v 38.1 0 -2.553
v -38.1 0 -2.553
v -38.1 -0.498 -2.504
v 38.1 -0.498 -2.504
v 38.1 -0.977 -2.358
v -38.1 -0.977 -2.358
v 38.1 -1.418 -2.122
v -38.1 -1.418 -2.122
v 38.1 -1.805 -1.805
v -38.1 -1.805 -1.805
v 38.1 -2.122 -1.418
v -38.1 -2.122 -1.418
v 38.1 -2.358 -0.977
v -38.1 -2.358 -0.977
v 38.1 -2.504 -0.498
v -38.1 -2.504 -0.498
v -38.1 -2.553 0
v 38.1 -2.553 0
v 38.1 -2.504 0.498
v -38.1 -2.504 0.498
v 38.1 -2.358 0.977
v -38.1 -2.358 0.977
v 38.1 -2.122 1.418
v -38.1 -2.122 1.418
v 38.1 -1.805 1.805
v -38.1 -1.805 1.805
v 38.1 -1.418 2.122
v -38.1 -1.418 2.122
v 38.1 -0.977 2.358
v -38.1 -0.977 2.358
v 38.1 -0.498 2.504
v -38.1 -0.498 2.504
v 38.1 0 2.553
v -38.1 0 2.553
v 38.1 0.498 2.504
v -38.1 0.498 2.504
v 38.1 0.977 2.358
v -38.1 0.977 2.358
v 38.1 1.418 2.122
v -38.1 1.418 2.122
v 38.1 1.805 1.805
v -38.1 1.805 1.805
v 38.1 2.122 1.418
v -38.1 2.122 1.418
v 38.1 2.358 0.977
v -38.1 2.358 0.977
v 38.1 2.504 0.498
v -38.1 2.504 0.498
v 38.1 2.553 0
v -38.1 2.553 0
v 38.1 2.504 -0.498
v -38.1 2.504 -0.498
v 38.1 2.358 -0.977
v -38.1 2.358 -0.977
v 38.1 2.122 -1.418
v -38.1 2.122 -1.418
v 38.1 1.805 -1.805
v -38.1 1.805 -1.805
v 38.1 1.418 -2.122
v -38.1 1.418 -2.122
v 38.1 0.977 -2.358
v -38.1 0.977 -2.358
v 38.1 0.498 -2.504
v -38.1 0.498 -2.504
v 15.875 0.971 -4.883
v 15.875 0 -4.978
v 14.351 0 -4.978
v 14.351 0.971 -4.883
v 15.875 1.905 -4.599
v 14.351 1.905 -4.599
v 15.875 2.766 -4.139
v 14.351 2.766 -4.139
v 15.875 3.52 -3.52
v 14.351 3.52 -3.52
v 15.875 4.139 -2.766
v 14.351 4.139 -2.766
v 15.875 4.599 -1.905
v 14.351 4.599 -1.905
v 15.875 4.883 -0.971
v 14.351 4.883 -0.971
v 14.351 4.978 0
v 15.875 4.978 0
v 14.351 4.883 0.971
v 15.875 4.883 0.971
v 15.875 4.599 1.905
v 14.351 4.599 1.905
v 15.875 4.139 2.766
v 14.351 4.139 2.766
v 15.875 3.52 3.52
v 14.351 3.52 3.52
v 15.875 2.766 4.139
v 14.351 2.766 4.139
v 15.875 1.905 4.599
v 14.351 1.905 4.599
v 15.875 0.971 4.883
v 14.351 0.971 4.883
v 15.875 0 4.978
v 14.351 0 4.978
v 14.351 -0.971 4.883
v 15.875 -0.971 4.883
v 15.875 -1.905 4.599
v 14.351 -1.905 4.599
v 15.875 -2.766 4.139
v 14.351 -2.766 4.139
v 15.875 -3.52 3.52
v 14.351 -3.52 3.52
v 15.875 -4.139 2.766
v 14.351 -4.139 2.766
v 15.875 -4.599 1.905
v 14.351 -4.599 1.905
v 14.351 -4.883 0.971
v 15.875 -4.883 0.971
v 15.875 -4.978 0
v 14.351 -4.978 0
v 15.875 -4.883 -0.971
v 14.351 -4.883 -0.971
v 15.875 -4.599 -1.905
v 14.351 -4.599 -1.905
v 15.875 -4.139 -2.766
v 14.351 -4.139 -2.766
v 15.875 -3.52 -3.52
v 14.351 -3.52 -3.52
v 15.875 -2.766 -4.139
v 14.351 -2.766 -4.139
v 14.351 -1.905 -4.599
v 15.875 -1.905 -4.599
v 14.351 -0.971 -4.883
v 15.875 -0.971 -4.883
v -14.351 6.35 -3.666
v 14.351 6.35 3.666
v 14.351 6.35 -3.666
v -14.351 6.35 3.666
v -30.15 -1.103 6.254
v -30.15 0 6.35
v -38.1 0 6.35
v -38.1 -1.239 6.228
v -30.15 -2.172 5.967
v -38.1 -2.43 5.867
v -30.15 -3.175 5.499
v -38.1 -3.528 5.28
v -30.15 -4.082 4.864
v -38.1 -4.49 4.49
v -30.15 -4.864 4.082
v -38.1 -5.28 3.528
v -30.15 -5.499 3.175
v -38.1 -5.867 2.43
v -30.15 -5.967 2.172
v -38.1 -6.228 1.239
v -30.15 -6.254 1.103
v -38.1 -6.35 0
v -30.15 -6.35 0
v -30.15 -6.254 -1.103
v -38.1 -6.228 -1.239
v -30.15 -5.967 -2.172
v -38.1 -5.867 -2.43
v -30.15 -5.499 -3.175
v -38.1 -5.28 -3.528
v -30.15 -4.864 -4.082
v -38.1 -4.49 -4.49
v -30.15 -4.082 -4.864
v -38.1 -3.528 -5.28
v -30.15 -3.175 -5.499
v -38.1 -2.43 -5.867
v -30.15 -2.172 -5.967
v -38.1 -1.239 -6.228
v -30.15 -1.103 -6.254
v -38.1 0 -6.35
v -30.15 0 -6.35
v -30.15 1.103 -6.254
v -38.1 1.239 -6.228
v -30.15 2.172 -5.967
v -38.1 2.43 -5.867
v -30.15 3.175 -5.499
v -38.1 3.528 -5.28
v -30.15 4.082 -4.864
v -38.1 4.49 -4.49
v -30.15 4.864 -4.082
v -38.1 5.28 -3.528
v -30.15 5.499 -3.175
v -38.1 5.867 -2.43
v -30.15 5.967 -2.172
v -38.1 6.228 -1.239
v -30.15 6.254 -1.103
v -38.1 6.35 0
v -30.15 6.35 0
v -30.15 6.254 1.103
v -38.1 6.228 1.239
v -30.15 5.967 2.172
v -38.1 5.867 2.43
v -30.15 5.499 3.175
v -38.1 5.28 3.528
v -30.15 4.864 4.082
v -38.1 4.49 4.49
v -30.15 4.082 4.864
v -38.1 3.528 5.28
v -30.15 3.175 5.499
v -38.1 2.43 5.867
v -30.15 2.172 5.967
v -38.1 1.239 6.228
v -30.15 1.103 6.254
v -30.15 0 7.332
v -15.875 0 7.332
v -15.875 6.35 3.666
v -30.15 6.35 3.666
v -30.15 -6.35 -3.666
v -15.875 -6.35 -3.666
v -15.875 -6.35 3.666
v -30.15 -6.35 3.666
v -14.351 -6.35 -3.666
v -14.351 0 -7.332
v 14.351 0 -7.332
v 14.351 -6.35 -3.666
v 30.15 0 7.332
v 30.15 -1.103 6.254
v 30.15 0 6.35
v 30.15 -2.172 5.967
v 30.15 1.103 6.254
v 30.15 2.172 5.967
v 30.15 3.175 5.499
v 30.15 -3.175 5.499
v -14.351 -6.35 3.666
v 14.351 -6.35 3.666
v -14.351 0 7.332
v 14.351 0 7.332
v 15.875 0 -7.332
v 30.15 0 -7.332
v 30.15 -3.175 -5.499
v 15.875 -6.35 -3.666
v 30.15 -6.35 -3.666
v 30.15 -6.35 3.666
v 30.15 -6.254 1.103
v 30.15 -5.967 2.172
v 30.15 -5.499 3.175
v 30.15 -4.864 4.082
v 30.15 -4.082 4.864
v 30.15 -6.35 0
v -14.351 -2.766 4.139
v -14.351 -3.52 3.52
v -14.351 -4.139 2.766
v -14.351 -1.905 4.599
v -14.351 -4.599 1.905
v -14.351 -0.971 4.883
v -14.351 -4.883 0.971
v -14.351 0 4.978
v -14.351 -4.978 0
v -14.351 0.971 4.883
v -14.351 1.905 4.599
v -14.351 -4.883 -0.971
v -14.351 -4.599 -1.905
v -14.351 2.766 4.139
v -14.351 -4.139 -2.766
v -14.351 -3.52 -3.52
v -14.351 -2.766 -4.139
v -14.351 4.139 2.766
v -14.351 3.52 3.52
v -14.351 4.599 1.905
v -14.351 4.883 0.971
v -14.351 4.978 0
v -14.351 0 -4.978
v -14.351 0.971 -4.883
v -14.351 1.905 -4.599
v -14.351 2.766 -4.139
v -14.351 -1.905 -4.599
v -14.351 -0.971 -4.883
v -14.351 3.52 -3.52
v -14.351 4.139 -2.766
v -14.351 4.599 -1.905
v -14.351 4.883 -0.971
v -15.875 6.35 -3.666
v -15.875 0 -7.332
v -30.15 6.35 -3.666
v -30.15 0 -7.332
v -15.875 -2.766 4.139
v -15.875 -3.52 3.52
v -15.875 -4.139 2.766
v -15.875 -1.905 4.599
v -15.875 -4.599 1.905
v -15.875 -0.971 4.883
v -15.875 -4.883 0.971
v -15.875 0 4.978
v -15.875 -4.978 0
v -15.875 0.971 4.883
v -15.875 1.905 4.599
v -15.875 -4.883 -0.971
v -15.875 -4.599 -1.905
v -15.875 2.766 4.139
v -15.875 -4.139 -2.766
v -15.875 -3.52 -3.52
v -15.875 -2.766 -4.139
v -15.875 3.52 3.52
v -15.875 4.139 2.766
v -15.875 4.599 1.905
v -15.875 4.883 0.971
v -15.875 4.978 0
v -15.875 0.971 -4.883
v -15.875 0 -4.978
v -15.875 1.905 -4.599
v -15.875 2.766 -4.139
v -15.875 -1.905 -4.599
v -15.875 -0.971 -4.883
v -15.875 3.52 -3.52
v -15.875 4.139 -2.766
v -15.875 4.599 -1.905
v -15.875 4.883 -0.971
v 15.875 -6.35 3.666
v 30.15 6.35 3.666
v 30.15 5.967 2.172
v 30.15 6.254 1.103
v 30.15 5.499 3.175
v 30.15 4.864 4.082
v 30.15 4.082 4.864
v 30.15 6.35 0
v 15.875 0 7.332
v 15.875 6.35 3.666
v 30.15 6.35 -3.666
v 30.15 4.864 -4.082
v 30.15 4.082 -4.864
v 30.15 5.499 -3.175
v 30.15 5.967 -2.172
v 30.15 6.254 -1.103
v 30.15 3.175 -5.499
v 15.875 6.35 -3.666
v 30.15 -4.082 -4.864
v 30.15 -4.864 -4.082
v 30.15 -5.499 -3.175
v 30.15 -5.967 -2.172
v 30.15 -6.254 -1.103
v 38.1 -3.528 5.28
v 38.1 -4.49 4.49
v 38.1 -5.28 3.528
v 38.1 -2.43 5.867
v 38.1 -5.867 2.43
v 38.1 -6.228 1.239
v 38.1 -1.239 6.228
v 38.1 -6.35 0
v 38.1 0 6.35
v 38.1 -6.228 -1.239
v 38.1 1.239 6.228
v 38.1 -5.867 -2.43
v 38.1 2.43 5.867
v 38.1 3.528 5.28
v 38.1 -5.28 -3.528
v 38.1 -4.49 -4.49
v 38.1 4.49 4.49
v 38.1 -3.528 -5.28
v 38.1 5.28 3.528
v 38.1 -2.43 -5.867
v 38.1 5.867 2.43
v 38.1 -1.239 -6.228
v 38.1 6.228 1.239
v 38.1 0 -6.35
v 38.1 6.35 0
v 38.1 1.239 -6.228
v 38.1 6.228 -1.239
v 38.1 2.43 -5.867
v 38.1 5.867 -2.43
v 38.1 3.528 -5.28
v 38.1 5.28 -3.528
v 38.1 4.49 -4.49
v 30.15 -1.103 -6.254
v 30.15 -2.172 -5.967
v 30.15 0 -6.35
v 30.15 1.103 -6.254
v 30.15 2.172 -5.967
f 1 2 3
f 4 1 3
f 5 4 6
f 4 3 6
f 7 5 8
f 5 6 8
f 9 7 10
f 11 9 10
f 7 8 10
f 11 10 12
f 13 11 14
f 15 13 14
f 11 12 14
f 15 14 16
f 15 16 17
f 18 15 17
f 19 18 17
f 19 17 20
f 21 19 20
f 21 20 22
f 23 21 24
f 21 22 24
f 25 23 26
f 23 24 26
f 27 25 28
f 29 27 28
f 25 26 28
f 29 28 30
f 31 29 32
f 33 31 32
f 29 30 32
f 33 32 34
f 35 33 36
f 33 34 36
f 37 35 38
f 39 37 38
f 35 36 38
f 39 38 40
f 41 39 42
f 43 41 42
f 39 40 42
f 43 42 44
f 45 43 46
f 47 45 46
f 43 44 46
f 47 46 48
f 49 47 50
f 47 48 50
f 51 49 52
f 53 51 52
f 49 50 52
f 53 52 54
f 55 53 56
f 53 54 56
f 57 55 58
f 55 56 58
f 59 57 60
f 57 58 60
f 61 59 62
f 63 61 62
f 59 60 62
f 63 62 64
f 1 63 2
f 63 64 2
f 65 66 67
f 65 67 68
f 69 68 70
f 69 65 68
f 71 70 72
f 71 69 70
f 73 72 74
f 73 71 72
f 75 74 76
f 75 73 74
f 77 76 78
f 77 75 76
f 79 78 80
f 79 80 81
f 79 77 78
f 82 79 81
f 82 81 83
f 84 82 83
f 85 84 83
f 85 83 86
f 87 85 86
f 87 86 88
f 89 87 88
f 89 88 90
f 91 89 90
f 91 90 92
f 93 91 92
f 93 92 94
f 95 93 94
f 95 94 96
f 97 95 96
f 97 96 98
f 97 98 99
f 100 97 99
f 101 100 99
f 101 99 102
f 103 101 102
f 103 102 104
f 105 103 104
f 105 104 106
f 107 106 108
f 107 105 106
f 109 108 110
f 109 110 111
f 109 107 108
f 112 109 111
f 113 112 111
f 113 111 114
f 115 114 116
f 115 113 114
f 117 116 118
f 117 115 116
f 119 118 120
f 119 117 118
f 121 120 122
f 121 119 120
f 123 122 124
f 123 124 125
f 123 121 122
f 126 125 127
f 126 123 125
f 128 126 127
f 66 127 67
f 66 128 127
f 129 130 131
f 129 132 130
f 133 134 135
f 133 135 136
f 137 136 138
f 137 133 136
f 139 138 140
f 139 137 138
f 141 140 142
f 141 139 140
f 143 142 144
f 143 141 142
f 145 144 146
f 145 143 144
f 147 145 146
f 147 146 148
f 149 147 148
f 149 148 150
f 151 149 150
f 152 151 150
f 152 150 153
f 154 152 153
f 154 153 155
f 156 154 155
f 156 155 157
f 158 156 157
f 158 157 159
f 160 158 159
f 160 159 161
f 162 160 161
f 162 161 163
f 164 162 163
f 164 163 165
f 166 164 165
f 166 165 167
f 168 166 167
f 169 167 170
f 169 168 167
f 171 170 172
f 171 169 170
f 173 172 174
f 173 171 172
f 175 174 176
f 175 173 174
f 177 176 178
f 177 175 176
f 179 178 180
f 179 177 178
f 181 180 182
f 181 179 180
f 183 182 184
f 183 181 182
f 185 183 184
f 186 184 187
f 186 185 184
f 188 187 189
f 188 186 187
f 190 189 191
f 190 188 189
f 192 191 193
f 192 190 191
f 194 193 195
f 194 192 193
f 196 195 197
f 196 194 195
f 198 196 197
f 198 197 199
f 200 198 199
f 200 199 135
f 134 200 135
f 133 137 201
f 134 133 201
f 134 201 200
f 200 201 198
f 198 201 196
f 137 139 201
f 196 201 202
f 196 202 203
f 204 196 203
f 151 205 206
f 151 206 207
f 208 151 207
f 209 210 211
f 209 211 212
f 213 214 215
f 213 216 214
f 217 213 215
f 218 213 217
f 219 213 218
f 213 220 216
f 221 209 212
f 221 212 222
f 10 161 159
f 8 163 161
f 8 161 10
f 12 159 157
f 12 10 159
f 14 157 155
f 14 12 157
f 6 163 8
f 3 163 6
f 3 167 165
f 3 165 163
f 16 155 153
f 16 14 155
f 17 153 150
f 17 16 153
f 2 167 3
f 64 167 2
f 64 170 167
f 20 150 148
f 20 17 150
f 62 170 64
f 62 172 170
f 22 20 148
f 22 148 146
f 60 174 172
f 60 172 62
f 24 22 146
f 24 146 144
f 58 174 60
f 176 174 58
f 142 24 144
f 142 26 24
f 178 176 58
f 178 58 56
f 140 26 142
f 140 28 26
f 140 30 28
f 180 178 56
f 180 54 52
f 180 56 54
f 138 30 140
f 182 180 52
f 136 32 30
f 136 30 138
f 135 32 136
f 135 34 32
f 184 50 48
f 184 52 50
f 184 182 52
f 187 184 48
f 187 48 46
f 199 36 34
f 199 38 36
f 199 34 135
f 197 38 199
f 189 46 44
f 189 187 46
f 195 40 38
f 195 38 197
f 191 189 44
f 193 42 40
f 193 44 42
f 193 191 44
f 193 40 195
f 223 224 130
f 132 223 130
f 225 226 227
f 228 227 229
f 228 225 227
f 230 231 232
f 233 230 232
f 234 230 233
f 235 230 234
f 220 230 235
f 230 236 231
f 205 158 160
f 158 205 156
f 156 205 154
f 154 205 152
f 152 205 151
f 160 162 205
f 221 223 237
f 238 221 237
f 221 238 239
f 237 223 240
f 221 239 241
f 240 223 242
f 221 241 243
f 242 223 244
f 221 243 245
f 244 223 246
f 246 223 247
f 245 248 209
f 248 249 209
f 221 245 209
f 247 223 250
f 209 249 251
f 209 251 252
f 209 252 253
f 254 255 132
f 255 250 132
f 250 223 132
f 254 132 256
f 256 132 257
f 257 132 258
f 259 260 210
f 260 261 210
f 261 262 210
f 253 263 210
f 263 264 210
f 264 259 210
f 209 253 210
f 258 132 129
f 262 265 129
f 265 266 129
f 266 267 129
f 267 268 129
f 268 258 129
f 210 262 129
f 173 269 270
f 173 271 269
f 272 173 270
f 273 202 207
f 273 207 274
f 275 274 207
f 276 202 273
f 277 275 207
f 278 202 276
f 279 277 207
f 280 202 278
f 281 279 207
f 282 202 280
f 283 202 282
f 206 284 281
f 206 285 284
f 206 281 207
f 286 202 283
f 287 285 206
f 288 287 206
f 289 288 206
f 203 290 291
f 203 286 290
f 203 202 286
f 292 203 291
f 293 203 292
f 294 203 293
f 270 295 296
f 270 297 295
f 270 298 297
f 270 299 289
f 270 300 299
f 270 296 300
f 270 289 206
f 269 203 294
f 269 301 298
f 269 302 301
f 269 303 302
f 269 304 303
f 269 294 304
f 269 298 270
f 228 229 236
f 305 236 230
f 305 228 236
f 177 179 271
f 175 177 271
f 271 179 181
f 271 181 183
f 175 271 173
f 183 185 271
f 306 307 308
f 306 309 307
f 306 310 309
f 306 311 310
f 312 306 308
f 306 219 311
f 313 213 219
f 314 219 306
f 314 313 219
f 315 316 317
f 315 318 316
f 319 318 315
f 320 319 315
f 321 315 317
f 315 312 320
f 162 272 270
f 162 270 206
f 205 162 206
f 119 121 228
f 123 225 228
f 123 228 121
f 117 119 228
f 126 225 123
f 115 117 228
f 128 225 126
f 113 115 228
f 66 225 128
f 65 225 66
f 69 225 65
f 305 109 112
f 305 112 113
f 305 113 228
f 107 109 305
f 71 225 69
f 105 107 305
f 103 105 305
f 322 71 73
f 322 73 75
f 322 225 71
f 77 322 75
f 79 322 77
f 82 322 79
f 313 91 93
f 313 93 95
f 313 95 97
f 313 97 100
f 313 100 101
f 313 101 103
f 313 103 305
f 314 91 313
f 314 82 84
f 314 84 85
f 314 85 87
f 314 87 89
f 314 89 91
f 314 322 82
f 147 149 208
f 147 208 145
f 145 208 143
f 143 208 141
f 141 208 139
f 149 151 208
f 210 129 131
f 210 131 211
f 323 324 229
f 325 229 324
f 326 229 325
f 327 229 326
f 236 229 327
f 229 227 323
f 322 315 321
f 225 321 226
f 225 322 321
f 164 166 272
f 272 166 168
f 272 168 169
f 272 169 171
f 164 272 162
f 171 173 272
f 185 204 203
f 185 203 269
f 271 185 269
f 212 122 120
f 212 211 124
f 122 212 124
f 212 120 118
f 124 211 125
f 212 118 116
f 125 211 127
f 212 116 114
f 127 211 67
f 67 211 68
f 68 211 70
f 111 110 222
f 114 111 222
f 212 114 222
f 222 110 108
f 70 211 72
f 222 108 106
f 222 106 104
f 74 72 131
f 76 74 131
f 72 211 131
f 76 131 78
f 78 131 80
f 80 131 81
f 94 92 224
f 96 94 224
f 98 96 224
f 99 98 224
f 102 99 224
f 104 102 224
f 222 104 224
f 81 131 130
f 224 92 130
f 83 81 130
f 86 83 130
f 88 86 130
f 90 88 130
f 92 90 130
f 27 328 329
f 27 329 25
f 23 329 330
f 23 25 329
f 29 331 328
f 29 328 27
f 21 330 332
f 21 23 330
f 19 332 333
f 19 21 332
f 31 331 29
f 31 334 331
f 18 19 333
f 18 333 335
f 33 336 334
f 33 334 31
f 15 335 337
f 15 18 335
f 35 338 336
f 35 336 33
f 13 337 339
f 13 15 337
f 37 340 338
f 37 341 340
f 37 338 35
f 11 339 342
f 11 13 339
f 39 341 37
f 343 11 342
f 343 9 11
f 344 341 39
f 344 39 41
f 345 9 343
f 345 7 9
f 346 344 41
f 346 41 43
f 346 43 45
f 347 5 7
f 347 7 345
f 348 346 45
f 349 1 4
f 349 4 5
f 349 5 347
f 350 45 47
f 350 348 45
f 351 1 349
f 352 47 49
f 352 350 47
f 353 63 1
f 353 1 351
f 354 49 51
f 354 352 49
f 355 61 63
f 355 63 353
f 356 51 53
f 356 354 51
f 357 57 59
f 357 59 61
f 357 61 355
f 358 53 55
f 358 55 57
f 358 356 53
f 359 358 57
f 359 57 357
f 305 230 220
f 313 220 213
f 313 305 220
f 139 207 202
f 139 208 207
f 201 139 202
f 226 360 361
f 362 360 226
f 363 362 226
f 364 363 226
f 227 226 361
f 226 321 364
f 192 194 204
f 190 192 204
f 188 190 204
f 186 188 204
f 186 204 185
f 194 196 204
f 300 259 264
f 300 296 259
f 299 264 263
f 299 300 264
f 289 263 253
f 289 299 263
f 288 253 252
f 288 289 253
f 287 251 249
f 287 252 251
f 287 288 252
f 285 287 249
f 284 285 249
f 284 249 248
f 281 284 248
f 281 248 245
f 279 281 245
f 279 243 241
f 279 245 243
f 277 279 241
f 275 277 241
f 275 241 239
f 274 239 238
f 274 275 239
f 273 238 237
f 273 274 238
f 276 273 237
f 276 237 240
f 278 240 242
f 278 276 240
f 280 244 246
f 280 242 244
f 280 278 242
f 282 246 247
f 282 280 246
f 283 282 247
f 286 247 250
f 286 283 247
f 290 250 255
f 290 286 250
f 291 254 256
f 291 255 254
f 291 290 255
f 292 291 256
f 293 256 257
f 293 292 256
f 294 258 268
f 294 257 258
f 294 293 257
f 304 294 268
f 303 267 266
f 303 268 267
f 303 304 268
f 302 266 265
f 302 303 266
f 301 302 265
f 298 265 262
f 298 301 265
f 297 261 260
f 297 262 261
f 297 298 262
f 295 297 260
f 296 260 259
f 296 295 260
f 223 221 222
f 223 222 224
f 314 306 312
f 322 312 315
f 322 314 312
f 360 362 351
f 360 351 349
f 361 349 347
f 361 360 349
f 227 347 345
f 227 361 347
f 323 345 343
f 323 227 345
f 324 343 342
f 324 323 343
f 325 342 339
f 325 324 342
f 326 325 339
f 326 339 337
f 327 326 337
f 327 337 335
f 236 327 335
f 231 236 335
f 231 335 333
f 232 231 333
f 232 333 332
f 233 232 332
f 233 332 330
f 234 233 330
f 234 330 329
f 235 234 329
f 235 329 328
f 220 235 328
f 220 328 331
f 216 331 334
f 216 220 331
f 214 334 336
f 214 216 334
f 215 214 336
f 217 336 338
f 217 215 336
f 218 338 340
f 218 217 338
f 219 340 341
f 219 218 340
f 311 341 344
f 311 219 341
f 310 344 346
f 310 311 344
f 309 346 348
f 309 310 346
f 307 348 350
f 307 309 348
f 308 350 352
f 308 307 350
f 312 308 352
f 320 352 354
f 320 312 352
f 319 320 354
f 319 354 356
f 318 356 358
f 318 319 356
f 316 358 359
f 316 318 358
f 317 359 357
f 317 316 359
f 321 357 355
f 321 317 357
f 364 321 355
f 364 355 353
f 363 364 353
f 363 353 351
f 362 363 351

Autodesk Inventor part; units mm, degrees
ref_plane "YZ Plane" through (0, 0, 0) normal (1, 0, 0) x (0, 1, 0)
ref_plane "XZ Plane" through (0, 0, 0) normal (0, 1, 0) x (-1, 0, 0)
ref_plane "XY Plane" through (0, 0, 0) normal (0, 0, 1) x (1, 0, 0)
sketch "Sketch1" plane through (0, 0, 0) normal (1, 0, 0) x (0, 1, 0)
  line L0 (0, -7.3323) -> (-6.35, -3.6662)
  line L1 (-6.35, -3.6662) -> (-6.35, 3.6662)
  line L2 (-6.35, 3.6662) -> (0, 7.3323)
  line L3 (0, 7.3323) -> (6.35, 3.6662)
  line L4 (6.35, 3.6662) -> (6.35, -3.6662)
  line L5 (6.35, -3.6662) -> (0, -7.3323)
  point P0 (0, 0)
  point P1 (0, 0)
  dimension "d0" = 12.7
extrude "Extrusion1" add sketch "Sketch1" along normal mid plane 60.2996
sketch "Sketch2" plane through (-30.1498, 0, 0) normal (-1, 0, 0) x (0, 0, 1)
  circle A0 centre (0, 0) radius 6.35
  dimension "d3" = 12.7
extrude "Extrusion2" add sketch "Sketch2" along normal blind 7.9502
sketch "Sketch3" plane through (30.1498, 0, 0) normal (1, 0, 0) x (0, 0, -1)
  circle A0 centre (0, 0) radius 6.35
  line L0 (3.6662, 6.35) -> (-3.6662, 6.35) projected
  line L1 (-3.6662, 6.35) -> (-7.3323, 0) projected
  line L2 (-7.3323, 0) -> (-3.6662, -6.35) projected
  line L3 (-3.6662, -6.35) -> (3.6662, -6.35) projected
  line L4 (3.6662, -6.35) -> (7.3323, 0) projected
  line L5 (7.3323, 0) -> (3.6662, 6.35) projected
  dimension "d6" = 12.7
extrude "Extrusion3" add sketch "Sketch3" along normal blind 7.9502 contours A0
sketch "Sketch4" plane through (38.1, 0, 0) normal (1, 0, 0) x (0, 0, -1)
  point P0 (0, 0)
  point P1 (0, 0)
hole "Hole1" at (38.1, 0, 0) direction (-1, 0, 0) diameter 5.1054 end through all clearance for "Flat Head Machine Screw (82)" size "#10" standard "Ansi Unified Screw Threads"
sketch "Sketch6" plane through (0, 0, 0) normal (0, 1, 0) x (-1, 0, 0)
  line L0 (30.1498, 6.35) -> (38.1, 6.35) projected
  line L1 (38.1, 6.35) -> (38.1, 2.5527) projected
  line L2 (38.1, 2.5527) -> (-38.1, 2.5527) projected
  line L3 (-38.1, 2.5527) -> (-38.1, 6.35) projected
  line L4 (-38.1, 6.35) -> (-30.1498, 6.35) projected
  line L5 (-30.1498, 6.35) -> (-30.1498, 7.3323) projected
  line L6 (-30.1498, 7.3323) -> (30.1498, 7.3323) projected
  line L7 (30.1498, 7.3323) -> (30.1498, 6.35) projected
  line L8 (38.1, -6.35) -> (30.1498, -6.35) projected
  line L9 (30.1498, -6.35) -> (30.1498, -7.3323) projected
  line L10 (30.1498, -7.3323) -> (-30.1498, -7.3323) projected
  line L11 (-30.1498, -7.3323) -> (-30.1498, -6.35) projected
  line L12 (-30.1498, -6.35) -> (-38.1, -6.35) projected
  line L13 (-38.1, -6.35) -> (-38.1, -2.5527) projected
  line L14 (-38.1, -2.5527) -> (38.1, -2.5527) projected
  line L15 (38.1, -2.5527) -> (38.1, -6.35) projected
  line L16 (38.1, 2.5527) -> (38.1, -2.5527) projected
  line L17 (38.1, 0) -> (-38.1, 0)
  line L18 (-38.1, 6.35) -> (-38.1, -6.35) projected
  line L19 (15.875, -7.3323) -> (14.351, -7.3323)
  line L20 (14.351, -7.3323) -> (14.351, -4.9784)
  line L21 (14.351, -4.9784) -> (15.875, -4.9784)
  line L22 (15.875, -4.9784) -> (15.875, -7.3323)
  point P0 (0, 0)
  dimension "d16" = 9.9568
  dimension "d17" = 1.524
  dimension "d18" = 22.225
revolve "Revolution1" cut sketch "Sketch6" angle 360 about axis through (-38.1, 0, 0) along (1, 0, 0) contours L10 L20 L21 L22
mirror "Mirror1" about plane through (0, 0, 0) normal (1, 0, 0) of "Revolution1"
properties part number "EL2-GB-005E-grove" material "Aluminum 6061"
